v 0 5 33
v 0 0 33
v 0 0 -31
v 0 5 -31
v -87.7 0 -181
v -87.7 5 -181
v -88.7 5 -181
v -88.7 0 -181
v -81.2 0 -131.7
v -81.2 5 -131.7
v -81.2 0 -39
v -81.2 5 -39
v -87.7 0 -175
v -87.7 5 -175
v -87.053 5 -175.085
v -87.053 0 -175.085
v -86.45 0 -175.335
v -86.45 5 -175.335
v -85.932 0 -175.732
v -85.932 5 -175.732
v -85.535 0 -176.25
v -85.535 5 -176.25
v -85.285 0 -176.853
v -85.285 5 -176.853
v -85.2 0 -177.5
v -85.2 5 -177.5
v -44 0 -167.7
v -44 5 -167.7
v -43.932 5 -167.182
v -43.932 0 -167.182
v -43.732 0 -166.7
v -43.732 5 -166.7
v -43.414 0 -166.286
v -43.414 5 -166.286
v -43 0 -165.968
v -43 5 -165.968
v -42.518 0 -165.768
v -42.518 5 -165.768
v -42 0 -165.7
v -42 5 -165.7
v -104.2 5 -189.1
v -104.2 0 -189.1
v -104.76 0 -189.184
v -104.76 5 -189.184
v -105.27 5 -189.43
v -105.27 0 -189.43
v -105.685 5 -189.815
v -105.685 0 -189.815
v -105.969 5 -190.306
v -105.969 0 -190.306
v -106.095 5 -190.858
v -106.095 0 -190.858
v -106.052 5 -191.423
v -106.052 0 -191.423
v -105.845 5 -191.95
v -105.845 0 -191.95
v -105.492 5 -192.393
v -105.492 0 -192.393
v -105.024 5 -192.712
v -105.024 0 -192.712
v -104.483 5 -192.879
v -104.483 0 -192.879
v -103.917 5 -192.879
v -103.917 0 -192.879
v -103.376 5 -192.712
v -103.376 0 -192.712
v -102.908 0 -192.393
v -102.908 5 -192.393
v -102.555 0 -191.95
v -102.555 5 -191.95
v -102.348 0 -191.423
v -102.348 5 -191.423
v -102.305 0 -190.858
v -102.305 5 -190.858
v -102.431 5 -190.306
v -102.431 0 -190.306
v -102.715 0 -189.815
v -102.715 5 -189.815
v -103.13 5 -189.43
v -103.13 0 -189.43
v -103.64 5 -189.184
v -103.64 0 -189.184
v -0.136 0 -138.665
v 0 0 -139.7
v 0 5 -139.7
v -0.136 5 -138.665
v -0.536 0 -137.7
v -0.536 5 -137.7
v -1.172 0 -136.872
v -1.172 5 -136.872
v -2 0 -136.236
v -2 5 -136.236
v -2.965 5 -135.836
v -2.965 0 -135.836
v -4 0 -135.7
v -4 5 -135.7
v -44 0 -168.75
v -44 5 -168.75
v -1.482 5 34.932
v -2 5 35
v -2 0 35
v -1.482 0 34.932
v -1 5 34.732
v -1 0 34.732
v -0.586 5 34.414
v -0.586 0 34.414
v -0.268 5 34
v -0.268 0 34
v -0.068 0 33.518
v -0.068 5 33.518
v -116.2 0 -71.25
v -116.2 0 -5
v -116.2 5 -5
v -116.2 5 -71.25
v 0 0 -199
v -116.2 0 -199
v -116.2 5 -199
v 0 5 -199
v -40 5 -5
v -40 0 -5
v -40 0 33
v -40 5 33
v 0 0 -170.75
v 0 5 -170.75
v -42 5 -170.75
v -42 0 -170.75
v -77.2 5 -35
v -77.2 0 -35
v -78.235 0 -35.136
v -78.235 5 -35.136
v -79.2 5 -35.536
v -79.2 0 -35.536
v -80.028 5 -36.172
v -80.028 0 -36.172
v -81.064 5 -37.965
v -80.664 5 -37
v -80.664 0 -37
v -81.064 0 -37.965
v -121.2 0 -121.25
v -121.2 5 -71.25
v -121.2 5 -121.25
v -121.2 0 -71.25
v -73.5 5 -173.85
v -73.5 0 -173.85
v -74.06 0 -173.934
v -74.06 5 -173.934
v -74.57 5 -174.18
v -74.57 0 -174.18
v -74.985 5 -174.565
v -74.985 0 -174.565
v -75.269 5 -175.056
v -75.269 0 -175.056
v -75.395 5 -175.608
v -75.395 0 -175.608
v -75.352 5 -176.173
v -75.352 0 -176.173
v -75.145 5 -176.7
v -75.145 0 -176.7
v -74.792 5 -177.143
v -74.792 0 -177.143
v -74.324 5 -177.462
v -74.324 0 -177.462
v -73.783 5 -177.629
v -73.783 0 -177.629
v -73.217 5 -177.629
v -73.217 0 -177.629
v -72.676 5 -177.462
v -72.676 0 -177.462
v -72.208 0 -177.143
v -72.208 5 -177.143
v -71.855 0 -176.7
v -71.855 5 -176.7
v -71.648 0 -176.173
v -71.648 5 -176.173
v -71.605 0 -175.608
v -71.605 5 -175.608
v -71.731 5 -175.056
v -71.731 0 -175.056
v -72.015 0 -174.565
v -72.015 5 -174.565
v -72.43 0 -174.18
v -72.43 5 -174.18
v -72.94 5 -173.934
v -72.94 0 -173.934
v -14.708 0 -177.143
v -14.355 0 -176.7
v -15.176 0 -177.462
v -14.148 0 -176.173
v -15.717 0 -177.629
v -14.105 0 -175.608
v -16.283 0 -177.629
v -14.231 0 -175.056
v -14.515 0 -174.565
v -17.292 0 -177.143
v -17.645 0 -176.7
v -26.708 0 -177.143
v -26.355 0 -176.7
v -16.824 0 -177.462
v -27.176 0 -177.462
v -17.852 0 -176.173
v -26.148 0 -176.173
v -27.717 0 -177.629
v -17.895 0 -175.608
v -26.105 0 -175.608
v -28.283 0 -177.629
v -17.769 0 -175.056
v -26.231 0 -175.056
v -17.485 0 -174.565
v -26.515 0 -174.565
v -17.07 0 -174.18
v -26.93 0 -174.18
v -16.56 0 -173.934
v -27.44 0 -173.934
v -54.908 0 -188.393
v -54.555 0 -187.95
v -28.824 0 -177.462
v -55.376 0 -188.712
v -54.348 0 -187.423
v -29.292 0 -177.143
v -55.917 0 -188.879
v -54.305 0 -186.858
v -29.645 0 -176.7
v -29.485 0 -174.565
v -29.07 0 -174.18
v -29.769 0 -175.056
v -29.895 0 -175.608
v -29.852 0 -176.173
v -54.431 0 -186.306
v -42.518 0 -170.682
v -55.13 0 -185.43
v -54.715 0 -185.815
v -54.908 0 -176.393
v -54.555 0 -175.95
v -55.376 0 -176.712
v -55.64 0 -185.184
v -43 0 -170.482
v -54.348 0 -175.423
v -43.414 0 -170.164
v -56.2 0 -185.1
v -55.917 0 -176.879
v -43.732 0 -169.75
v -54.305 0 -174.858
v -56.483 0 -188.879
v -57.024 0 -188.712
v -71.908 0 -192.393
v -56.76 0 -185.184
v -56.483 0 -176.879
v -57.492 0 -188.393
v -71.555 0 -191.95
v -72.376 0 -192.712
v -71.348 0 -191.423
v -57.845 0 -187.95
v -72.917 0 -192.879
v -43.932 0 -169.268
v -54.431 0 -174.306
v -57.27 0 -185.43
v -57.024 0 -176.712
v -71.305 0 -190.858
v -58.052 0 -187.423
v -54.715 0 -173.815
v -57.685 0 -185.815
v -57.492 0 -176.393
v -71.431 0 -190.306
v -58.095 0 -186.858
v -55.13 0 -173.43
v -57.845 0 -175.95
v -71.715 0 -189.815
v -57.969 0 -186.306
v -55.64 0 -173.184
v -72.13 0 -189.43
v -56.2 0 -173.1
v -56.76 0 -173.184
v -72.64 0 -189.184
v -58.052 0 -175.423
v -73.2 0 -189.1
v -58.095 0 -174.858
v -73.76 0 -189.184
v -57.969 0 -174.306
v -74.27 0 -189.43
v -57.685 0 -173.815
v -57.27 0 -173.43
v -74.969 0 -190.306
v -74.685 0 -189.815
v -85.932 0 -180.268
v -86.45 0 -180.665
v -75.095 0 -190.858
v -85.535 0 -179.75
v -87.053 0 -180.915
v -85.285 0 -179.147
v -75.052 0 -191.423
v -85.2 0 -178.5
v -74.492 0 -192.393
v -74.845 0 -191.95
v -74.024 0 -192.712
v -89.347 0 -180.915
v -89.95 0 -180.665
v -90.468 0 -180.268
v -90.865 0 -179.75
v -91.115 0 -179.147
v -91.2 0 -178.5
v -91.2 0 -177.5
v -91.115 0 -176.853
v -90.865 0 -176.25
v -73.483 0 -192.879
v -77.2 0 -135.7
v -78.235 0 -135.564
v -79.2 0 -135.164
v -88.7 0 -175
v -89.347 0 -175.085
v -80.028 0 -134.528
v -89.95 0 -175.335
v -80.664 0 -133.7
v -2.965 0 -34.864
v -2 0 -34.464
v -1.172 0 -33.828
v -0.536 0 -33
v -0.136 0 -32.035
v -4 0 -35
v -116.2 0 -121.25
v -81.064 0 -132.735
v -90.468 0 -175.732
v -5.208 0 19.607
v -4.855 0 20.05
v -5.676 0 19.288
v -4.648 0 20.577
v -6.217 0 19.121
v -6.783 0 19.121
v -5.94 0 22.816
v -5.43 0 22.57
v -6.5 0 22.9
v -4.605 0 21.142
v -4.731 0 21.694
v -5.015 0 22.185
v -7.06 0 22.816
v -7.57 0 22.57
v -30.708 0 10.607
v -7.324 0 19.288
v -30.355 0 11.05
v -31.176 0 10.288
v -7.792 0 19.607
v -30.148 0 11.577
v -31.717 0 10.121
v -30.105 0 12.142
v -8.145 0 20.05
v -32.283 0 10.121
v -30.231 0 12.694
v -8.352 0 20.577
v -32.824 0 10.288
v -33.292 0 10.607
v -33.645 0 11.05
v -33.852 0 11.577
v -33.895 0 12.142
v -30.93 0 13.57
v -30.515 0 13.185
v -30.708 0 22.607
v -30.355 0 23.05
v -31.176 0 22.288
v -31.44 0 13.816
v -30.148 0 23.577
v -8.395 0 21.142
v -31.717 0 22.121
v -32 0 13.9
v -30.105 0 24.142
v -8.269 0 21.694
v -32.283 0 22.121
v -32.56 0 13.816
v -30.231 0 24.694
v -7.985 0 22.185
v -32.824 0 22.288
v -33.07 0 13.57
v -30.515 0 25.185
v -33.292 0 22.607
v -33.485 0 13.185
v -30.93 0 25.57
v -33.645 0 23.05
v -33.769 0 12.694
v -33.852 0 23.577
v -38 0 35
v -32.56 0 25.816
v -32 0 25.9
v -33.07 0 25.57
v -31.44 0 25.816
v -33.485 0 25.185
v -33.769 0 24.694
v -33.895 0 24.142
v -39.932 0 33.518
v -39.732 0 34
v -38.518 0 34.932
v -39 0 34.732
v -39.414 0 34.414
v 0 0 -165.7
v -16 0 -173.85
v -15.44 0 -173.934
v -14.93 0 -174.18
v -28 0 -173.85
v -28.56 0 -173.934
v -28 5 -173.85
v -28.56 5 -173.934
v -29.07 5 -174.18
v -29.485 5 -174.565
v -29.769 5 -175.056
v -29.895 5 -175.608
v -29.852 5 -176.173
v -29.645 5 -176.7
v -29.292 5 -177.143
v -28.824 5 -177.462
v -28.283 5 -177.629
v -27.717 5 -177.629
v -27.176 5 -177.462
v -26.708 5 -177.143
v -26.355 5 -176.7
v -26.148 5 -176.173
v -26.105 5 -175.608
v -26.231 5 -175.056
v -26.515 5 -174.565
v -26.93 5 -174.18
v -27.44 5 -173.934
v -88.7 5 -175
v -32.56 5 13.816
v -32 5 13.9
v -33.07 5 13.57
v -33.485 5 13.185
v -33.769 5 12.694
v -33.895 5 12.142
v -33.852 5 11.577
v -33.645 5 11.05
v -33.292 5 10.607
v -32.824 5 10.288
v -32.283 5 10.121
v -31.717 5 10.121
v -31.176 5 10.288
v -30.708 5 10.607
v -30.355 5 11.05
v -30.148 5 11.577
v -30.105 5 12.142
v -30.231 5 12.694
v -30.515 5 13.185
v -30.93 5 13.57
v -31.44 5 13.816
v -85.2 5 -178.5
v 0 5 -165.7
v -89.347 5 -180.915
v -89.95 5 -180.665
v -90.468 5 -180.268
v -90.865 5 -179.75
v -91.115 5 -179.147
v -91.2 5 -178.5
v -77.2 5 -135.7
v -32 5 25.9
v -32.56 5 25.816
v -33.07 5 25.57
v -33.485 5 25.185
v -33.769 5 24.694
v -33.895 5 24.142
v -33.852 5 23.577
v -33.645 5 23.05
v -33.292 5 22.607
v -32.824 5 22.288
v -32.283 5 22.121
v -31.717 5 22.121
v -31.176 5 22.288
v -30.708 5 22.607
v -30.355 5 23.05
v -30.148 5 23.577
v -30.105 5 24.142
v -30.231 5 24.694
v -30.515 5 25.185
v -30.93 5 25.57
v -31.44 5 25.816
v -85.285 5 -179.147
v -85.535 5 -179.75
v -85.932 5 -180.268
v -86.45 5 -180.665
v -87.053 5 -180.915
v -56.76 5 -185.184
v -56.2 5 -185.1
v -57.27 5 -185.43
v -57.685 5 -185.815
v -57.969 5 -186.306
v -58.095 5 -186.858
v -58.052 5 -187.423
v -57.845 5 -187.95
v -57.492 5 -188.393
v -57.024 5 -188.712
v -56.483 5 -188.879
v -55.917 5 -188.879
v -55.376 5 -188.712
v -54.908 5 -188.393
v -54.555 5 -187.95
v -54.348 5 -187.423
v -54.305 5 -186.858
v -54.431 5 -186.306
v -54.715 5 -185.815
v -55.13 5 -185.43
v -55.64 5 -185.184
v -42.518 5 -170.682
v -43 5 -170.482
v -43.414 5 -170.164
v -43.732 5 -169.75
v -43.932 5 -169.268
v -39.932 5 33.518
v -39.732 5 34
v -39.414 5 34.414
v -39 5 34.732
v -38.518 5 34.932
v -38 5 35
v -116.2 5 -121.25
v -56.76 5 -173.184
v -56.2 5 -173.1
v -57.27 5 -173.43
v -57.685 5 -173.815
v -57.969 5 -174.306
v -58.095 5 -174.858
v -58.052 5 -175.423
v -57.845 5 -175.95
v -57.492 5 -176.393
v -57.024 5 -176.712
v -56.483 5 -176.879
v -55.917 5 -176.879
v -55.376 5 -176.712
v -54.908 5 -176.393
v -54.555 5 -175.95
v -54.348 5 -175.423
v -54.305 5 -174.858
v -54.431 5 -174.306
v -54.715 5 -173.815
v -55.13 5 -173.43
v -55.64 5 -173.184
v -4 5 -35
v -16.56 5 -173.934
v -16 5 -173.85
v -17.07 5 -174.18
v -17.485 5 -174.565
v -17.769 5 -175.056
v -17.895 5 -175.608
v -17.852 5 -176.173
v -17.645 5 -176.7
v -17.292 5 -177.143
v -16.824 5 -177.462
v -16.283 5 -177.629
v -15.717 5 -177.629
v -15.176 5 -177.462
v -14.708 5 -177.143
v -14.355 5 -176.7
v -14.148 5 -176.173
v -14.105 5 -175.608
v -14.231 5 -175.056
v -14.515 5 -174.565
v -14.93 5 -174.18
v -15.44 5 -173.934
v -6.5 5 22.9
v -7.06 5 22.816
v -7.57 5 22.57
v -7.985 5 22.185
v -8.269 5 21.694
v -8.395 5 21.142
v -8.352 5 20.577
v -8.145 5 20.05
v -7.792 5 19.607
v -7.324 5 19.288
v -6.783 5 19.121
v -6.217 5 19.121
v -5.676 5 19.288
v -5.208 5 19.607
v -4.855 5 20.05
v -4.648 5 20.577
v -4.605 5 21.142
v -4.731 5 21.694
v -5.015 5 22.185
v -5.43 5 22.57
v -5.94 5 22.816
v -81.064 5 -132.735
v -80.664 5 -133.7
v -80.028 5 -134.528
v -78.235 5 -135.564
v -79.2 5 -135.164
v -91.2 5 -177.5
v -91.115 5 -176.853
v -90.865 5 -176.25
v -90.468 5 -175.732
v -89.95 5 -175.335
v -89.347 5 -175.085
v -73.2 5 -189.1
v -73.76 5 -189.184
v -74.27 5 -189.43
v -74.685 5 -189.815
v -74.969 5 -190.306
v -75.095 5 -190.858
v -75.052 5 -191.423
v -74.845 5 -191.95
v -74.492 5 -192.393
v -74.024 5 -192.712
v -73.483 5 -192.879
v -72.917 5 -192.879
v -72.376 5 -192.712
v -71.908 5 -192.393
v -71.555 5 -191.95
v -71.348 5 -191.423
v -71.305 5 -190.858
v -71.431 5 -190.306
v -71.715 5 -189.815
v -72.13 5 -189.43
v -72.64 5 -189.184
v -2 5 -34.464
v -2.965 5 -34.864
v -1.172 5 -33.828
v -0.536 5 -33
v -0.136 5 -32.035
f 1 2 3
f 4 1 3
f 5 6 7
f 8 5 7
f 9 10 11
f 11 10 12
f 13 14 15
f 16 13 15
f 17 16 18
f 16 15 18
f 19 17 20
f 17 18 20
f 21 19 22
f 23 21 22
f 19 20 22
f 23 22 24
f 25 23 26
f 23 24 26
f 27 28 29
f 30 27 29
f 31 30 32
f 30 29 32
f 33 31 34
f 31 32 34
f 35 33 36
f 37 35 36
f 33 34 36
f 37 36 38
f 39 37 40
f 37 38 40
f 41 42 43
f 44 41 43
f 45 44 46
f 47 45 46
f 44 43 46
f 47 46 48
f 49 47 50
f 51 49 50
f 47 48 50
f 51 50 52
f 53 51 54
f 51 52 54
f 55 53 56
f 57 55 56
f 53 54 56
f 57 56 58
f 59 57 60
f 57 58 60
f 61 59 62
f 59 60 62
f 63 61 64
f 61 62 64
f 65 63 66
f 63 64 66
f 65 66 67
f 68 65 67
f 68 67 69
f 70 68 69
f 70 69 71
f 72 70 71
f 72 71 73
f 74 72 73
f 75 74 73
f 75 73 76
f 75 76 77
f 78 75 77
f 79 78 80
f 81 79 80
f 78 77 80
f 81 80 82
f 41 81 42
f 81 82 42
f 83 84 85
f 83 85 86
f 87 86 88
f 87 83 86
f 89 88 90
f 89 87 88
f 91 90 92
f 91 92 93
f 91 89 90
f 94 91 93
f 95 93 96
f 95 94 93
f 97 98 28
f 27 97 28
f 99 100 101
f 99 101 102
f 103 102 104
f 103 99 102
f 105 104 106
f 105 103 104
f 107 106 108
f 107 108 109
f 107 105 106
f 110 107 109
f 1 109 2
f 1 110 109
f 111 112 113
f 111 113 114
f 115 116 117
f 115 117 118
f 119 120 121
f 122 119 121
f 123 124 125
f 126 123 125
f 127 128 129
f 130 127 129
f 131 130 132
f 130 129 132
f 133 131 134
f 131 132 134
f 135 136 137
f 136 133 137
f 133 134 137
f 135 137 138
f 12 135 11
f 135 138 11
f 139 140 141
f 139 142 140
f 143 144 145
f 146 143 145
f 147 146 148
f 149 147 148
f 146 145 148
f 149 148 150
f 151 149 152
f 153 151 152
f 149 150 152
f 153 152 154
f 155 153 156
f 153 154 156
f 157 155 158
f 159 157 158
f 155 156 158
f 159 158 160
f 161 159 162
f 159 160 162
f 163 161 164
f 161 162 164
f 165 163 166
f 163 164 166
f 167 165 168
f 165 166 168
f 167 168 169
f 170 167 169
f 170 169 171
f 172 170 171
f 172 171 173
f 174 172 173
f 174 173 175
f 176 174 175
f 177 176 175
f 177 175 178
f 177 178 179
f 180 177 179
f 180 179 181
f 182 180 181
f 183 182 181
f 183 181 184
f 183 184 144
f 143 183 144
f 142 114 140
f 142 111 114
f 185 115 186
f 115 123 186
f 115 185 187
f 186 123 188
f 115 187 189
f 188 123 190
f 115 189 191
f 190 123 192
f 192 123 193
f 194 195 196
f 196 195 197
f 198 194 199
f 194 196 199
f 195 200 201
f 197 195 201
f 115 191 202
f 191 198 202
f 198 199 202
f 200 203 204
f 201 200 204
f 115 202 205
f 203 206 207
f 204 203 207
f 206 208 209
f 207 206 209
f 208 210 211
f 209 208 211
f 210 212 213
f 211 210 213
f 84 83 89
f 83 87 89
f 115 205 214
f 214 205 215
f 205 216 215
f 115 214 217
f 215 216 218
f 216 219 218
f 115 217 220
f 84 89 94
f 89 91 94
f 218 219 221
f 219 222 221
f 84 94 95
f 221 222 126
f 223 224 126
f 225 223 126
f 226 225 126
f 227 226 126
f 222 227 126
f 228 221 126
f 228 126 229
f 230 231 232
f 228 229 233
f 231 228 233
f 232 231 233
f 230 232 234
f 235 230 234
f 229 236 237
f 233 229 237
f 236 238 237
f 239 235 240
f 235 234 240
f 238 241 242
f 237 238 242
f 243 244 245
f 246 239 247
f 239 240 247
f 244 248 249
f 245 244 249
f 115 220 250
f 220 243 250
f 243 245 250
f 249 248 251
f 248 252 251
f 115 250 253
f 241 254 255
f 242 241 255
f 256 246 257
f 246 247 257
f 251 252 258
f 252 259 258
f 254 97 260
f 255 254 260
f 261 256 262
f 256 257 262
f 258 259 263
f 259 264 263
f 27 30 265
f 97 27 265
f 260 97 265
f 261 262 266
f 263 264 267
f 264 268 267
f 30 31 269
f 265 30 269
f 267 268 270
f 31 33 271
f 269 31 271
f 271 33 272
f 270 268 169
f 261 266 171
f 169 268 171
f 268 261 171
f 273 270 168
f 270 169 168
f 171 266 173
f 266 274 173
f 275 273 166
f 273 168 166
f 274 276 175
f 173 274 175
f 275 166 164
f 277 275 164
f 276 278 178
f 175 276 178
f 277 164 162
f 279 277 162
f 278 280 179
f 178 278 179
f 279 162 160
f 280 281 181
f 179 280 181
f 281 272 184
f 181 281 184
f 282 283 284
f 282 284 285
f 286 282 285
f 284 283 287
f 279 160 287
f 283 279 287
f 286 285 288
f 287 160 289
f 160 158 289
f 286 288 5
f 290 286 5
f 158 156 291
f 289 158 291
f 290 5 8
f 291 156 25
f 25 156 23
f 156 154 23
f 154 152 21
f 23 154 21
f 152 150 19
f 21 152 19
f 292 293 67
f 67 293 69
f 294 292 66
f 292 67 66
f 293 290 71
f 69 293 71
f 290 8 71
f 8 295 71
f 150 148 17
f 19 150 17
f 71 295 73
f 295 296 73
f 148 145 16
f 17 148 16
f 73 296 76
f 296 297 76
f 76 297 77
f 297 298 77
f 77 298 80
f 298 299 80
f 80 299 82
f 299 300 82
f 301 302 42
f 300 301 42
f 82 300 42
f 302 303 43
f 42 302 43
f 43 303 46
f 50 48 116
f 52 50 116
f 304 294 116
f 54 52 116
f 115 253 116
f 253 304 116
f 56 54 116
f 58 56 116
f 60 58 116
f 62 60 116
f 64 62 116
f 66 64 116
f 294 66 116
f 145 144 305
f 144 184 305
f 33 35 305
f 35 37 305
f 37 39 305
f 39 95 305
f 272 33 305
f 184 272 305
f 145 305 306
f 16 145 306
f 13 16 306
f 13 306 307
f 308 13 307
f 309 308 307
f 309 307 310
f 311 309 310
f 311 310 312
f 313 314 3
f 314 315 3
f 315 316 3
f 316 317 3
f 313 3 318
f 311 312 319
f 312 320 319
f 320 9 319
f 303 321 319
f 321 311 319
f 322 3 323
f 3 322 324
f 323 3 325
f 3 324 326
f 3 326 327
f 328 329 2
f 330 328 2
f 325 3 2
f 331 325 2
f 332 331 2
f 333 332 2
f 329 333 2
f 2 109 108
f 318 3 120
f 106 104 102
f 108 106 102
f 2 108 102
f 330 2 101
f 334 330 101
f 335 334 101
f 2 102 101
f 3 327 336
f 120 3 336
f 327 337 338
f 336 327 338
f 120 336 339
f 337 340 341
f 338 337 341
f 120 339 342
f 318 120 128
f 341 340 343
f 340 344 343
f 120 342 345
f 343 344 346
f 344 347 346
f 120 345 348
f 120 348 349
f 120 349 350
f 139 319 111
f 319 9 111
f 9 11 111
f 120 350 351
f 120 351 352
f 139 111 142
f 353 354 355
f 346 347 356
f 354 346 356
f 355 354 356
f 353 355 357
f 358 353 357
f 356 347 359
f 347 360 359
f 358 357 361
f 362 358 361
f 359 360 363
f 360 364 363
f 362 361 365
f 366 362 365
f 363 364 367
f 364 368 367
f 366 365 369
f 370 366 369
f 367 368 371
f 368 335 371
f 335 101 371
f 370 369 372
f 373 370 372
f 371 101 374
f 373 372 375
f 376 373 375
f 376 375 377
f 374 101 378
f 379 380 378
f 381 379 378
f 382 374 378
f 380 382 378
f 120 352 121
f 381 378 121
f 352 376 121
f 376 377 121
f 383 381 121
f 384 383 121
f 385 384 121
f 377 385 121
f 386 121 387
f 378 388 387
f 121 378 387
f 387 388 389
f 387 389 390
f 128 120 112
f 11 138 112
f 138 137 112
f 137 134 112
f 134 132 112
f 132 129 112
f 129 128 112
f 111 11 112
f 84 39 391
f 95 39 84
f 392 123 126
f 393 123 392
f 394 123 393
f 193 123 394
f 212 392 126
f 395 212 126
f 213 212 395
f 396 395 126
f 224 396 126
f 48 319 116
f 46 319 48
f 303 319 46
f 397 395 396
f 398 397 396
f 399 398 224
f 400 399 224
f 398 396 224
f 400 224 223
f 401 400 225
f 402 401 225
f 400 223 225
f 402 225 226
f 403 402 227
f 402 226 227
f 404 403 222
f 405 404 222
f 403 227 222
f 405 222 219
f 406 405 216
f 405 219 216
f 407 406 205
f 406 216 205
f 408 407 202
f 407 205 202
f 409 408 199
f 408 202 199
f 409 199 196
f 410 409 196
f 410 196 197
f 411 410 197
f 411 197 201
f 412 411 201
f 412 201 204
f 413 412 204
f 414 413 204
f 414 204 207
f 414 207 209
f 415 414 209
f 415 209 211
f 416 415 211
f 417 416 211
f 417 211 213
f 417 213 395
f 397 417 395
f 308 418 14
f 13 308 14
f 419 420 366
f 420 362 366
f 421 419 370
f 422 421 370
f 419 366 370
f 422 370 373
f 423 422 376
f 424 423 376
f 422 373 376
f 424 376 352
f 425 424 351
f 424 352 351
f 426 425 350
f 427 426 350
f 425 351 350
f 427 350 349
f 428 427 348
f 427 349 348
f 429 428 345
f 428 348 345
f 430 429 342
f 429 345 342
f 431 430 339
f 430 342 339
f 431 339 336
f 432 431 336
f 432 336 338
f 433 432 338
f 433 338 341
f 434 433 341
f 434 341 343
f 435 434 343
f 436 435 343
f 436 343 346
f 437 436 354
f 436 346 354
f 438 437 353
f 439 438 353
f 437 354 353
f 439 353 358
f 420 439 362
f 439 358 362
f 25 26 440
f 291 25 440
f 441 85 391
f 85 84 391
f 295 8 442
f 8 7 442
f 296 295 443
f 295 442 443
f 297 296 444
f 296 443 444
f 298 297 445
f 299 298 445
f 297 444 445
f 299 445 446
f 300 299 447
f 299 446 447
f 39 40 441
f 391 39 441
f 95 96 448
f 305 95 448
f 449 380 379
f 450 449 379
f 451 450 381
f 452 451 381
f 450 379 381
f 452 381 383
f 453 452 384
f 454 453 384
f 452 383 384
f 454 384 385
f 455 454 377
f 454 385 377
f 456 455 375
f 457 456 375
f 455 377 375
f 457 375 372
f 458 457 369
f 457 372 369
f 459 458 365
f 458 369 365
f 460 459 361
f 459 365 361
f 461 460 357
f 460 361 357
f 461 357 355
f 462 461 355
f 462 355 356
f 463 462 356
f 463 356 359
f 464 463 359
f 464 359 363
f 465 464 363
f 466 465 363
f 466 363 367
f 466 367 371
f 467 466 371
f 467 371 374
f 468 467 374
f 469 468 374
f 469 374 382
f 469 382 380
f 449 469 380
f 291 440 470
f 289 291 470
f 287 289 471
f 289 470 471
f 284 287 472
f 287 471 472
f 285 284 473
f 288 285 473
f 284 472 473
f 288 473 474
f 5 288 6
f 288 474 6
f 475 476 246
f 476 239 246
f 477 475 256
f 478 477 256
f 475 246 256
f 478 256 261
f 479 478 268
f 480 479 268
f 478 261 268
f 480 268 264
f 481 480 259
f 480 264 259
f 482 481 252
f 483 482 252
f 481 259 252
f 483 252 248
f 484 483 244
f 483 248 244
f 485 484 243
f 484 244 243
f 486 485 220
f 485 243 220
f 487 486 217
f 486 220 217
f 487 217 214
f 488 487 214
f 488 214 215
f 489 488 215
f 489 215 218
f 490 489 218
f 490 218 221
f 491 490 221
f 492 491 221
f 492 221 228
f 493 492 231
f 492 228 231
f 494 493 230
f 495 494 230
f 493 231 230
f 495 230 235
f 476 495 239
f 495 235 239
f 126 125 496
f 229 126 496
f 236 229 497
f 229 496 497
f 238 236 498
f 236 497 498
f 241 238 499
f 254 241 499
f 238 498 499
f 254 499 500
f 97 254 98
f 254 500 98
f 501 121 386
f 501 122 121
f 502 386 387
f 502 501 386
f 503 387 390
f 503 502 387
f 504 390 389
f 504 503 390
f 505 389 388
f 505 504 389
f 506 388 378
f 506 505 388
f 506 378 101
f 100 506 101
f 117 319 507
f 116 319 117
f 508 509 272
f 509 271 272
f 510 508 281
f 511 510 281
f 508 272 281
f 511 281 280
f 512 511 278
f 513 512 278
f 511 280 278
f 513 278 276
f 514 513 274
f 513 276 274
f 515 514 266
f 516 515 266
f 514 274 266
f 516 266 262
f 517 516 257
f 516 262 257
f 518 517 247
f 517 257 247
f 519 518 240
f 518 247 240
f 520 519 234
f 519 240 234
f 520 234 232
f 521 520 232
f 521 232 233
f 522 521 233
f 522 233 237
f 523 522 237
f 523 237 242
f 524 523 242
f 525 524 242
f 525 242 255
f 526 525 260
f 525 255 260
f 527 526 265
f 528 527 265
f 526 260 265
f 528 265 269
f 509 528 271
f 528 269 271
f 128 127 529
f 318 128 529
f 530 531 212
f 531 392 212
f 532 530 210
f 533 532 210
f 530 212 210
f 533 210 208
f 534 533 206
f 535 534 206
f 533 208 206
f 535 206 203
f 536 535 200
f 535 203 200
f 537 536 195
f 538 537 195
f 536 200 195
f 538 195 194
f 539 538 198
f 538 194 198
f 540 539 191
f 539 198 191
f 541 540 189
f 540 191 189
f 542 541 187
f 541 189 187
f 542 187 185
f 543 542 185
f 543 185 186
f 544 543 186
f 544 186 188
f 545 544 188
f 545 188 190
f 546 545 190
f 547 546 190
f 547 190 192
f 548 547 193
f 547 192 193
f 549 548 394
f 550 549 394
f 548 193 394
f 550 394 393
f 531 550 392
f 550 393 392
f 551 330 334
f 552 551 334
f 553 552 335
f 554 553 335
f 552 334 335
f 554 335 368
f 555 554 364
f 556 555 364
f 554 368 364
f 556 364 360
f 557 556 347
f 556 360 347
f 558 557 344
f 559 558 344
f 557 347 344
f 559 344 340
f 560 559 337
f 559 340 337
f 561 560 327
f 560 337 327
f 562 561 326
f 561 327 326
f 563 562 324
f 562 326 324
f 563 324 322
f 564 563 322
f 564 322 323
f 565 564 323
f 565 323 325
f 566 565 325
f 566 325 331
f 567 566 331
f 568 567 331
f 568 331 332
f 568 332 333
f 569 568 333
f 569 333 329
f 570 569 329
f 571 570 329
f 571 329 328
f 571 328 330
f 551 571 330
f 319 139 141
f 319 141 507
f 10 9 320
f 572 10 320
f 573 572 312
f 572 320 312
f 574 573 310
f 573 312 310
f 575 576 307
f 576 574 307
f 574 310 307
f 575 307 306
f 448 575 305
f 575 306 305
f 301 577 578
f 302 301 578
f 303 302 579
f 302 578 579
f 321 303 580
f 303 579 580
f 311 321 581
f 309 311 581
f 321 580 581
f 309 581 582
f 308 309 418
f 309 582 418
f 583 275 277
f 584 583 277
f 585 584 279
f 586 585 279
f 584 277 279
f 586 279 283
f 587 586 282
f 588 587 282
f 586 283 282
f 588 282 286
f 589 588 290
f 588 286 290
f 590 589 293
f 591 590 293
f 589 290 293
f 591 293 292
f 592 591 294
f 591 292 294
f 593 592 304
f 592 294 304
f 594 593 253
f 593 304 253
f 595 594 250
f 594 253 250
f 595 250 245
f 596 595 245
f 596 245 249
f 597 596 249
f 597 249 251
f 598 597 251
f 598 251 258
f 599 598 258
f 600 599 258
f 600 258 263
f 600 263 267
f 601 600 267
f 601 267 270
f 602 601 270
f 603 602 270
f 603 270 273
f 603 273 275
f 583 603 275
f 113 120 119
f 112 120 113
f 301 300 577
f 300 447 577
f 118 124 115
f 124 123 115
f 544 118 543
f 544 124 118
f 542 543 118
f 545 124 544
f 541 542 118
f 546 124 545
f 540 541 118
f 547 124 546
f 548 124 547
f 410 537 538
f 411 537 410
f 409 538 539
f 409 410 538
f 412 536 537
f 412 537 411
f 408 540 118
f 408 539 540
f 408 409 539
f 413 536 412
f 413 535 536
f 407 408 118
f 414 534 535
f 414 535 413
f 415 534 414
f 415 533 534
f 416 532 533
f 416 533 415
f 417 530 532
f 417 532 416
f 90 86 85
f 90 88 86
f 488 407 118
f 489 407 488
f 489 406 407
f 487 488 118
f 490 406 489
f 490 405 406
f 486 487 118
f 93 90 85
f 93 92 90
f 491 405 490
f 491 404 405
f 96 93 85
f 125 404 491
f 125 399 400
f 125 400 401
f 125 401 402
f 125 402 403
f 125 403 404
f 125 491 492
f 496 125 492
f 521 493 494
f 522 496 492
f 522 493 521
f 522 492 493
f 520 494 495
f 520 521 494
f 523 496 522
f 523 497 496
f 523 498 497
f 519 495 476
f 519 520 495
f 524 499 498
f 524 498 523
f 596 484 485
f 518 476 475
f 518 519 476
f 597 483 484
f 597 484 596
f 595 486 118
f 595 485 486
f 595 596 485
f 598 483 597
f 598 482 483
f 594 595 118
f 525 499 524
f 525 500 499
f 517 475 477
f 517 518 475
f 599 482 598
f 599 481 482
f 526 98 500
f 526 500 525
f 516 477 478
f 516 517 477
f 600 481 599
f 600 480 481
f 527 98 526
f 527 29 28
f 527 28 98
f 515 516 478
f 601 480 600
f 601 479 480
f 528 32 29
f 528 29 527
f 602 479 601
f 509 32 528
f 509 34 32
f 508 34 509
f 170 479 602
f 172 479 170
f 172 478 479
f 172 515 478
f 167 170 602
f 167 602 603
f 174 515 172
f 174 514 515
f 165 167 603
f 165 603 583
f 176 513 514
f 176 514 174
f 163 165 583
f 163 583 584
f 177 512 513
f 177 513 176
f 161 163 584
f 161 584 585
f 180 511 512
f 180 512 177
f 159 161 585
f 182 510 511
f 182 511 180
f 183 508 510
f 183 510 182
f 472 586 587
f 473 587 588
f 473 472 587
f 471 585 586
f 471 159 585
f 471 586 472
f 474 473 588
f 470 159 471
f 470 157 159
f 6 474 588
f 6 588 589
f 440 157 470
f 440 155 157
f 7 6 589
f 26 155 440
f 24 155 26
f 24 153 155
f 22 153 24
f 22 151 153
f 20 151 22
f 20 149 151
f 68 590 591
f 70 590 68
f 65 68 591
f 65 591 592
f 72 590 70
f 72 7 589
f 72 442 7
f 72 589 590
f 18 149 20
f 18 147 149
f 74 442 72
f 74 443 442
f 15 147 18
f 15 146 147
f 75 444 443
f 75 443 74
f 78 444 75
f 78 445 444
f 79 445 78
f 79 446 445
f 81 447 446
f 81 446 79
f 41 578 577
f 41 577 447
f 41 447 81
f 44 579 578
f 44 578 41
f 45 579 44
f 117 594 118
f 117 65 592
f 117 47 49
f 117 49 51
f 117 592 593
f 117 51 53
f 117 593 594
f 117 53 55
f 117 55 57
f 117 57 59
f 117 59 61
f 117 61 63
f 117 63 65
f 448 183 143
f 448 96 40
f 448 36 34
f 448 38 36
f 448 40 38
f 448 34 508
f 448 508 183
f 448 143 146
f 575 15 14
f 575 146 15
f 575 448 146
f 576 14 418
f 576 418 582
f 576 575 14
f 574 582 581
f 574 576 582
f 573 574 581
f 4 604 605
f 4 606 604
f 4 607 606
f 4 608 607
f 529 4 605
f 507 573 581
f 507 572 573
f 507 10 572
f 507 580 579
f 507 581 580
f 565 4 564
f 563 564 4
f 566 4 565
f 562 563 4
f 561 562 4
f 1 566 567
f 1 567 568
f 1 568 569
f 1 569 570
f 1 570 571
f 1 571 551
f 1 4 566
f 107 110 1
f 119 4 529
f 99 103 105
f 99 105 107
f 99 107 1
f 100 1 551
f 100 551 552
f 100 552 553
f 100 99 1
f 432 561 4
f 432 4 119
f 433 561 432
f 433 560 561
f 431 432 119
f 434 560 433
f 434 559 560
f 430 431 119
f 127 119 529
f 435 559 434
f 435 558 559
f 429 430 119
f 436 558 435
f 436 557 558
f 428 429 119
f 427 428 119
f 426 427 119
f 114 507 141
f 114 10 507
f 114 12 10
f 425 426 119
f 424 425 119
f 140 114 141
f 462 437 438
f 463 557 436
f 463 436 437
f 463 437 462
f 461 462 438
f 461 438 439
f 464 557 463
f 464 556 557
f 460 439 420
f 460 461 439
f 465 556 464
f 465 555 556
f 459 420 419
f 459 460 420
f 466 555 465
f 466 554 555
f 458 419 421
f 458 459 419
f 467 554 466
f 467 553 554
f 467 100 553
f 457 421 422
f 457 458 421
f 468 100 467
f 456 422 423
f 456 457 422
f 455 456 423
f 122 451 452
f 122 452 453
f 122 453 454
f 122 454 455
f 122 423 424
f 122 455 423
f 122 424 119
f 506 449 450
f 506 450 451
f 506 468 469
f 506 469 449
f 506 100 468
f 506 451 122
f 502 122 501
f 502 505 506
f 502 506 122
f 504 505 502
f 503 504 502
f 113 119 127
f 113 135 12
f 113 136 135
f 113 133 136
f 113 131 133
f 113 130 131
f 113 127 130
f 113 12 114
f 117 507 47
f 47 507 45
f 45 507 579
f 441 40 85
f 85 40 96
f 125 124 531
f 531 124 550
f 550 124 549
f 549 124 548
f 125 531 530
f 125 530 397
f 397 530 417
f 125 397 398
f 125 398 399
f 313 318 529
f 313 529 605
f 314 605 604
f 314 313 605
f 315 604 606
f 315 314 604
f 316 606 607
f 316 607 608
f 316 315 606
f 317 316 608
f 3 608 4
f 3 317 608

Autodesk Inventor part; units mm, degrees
ref_plane "YZ Plane" through (0, 0, 0) normal (1, 0, 0) x (0, 1, 0)
ref_plane "XZ Plane" through (0, 0, 0) normal (0, 1, 0) x (-1, 0, 0)
ref_plane "XY Plane" through (0, 0, 0) normal (0, 0, 1) x (1, 0, 0)
sketch "Sketch1" plane through (0, 0, 0) normal (0, 1, 0) x (-1, 0, 0)
  line L0 (40, -5) -> (116.2, -5)
  line L1 (116.2, -199) -> (0, -199)
  line L2 (0, -199) -> (0, 0)
  line L3 (40, -5) -> (40, 35)
  line L4 (40, 35) -> (0, 35)
  line L5 (0, 35) -> (0, 0)
  line L6 (116.2, -71.25) -> (121.2, -71.25)
  line L7 (121.2, -71.25) -> (121.2, -121.25)
  line L8 (121.2, -121.25) -> (116.2, -121.25)
  line L9 (116.2, -5) -> (116.2, -71.25)
  line L10 (116.2, -121.25) -> (116.2, -199)
  dimension "d0" = 116.2
  dimension "d6" = 77.75
  dimension "d8" = 50
  dimension "d9" = 5
  dimension "d11" = 40
  dimension "d12" = 40
  dimension "d31" = 194
extrude "Extrusion1" add sketch "Sketch1" along normal blind 5
sketch "Sketch2" plane through (0, 5, 0) normal (0, 1, 0) x (1, 0, 0)
  line L0 (-32, -64.6005) -> (-32, 40.6005) construction
  line L1 (-139.7989, 191) -> (-75.0444, 191) construction
  line L2 (0, 199) -> (-116.2, 199) projected
  line L3 (-116.2, 199) -> (-116.2, 121.25) projected
  line L4 (-116.2, 5) -> (-40, 5) projected
  line L5 (-40, 5) -> (-40, -35) projected
  point P0 (0, 0)
  point P1 (-32, -24)
  point P2 (-32, -12)
  point P3 (-104.2, 191)
  point P4 (-73.2, 191)
  point P5 (-32, -12)
  dimension "d16" = 31
  dimension "d17" = 8
  dimension "d18" = 12
  dimension "d19" = 17
  dimension "d20" = 12
  dimension "d21" = 8
hole "Hole1" at (-32, 5, 24) at (-32, 5, 12) at (-104.2, 5, -191) at (-73.2, 5, -191) direction (0, -1, 0) diameter 3.8 end through all
fillet "Fillet1" radius 2 2 edges at (-40, 2.5, 35) (0, 2.5, 35)
sketch "Sketch3" plane through (0, 5, 0) normal (0, 1, 0) x (1, 0, 0)
  line L0 (-56.2, 96.1981) -> (-56.2, 272.5509) construction
  line L1 (-116.2, 199) -> (-116.2, 121.25) projected
  line L2 (0, 199) -> (-116.2, 199) projected
  point P0 (0, 0)
  point P1 (-56.2, 187)
  point P2 (-56.2, 175)
  dimension "d32" = 60
  dimension "d33" = 12
  dimension "d34" = 12
hole "Hole2" at (-56.2, 5, -187) at (-56.2, 5, -175) direction (0, -1, 0) diameter 3.8 end through all
sketch "Sketch5" plane through (0, 5, 0) normal (0, 1, 0) x (1, 0, 0)
  line L0 (0, -33) -> (0, 199) projected
  line L1 (0, 170.75) -> (-42, 170.75)
  line L2 (-44, 168.75) -> (-44, 167.7)
  line L3 (-42, 165.7) -> (0, 165.7)
  line L4 (0, 165.7) -> (0, 170.75)
  line L5 (0, 199) -> (-116.2, 199) projected
  arc A0 (-44, 167.7) -> (-42, 165.7) centre (-42, 167.7) ccw
  arc A1 (-42, 170.75) -> (-44, 168.75) centre (-42, 168.75) ccw
  point P0 (0, 0)
  point P1 (-44, 165.7)
  point P2 (-44, 170.75)
  point P3 (0, 165.7)
  dimension "d47" = 44
  dimension "d48" = 5.05
  dimension "d49" = 33.3
  dimension "d50" = 2
extrude "Extrusion3" cut sketch "Sketch5" against normal blind 5
sketch "Sketch6" plane through (0, 5, 0) normal (0, 1, 0) x (1, 0, 0)
  line L0 (-135.5788, 175.75) -> (79.5788, 175.75) construction
  line L1 (0, 199) -> (-116.2, 199) construction
  line L2 (0, 170.75) -> (0, 199) construction
  point P0 (0, 0)
  point P1 (-16, 175.75)
  point P2 (-28, 175.75)
  point P3 (-73.5, 175.75)
  dimension "d53" = 23.25
  dimension "d54" = 16
  dimension "d55" = 28
  dimension "d56" = 73.5
hole "Hole3" at (-16, 5, -175.75) at (-28, 5, -175.75) at (-73.5, 5, -175.75) direction (0, -1, 0) diameter 3.8 end through all
sketch "Sketch7" plane through (0, 5, 0) normal (0, 1, 0) x (1, 0, 0)
  line L0 (-6.5, 43.9272) -> (-6.5, -51.0616) construction
  line L1 (0, -33) -> (0, 165.7) projected
  line L2 (-38, -35) -> (-2, -35) projected
  point P0 (0, 0)
  point P1 (-6.5, -21)
  dimension "d64" = 6.5
  dimension "d65" = 14
hole "Hole4" at (-6.5, 5, 21) direction (0, -1, 0) diameter 3.8 end through all
sketch "Sketch8" plane through (0, 5, 0) normal (0, 1, 0) x (1, 0, 0)
  line L0 (-129.4929, 178) -> (-73.5, 178) construction
  line L1 (0, 199) -> (-116.2, 199) projected
  line L2 (-88.7, 175) -> (-87.7, 175)
  line L3 (-85.2, 177.5) -> (-85.2, 178.5)
  line L4 (-87.7, 181) -> (-88.7, 181)
  line L5 (-91.2, 178.5) -> (-91.2, 177.5)
  line L6 (-91.2, 175) -> (-85.2, 181) construction
  line L7 (-85.2, 175) -> (-91.2, 181) construction
  line L8 (-116.2, 199) -> (-116.2, 121.25) projected
  arc A0 (-88.7, 181) -> (-91.2, 178.5) centre (-88.7, 178.5) ccw
  arc A1 (-91.2, 177.5) -> (-88.7, 175) centre (-88.7, 177.5) ccw
  arc A2 (-87.7, 175) -> (-85.2, 177.5) centre (-87.7, 177.5) ccw
  arc A3 (-85.2, 178.5) -> (-87.7, 181) centre (-87.7, 178.5) ccw
  point P0 (0, 0)
  point P1 (-88.2, 178)
  dimension "d73" = 21
  dimension "d74" = 6
  dimension "d75" = 6
  dimension "d76" = 25
  dimension "d77" = 2.5
extrude "Extrusion4" cut sketch "Sketch8" against normal through all
sketch "Sketch9" plane through (0, 5, 0) normal (0, 1, 0) x (1, 0, 0)
  line L0 (0, -33) -> (0, 165.7) projected
  line L1 (0, 135.7) -> (-81.2, 135.7)
  line L2 (-81.2, 135.7) -> (-81.2, 35)
  line L3 (-81.2, 35) -> (0, 35)
  line L4 (0, 35) -> (0, 135.7)
  line L5 (0, 165.7) -> (-42, 165.7) projected
  line L6 (-116.2, 5) -> (-40, 5) projected
  line L7 (-116.2, 199) -> (-116.2, 121.25) projected
  point P0 (0, 0)
  point P1 (0, 35)
  dimension "d80" = 30
  dimension "d81" = 30
  dimension "d82" = 35
extrude "Extrusion5" cut sketch "Sketch9" against normal through all
fillet "Fillet3" radius 4 4 edges at (-81.2, 2.5, -135.7) (-81.2, 2.5, -35) (0, 2.5, -35) (0, 2.5, -135.7)
properties part number "BAttery divider"
